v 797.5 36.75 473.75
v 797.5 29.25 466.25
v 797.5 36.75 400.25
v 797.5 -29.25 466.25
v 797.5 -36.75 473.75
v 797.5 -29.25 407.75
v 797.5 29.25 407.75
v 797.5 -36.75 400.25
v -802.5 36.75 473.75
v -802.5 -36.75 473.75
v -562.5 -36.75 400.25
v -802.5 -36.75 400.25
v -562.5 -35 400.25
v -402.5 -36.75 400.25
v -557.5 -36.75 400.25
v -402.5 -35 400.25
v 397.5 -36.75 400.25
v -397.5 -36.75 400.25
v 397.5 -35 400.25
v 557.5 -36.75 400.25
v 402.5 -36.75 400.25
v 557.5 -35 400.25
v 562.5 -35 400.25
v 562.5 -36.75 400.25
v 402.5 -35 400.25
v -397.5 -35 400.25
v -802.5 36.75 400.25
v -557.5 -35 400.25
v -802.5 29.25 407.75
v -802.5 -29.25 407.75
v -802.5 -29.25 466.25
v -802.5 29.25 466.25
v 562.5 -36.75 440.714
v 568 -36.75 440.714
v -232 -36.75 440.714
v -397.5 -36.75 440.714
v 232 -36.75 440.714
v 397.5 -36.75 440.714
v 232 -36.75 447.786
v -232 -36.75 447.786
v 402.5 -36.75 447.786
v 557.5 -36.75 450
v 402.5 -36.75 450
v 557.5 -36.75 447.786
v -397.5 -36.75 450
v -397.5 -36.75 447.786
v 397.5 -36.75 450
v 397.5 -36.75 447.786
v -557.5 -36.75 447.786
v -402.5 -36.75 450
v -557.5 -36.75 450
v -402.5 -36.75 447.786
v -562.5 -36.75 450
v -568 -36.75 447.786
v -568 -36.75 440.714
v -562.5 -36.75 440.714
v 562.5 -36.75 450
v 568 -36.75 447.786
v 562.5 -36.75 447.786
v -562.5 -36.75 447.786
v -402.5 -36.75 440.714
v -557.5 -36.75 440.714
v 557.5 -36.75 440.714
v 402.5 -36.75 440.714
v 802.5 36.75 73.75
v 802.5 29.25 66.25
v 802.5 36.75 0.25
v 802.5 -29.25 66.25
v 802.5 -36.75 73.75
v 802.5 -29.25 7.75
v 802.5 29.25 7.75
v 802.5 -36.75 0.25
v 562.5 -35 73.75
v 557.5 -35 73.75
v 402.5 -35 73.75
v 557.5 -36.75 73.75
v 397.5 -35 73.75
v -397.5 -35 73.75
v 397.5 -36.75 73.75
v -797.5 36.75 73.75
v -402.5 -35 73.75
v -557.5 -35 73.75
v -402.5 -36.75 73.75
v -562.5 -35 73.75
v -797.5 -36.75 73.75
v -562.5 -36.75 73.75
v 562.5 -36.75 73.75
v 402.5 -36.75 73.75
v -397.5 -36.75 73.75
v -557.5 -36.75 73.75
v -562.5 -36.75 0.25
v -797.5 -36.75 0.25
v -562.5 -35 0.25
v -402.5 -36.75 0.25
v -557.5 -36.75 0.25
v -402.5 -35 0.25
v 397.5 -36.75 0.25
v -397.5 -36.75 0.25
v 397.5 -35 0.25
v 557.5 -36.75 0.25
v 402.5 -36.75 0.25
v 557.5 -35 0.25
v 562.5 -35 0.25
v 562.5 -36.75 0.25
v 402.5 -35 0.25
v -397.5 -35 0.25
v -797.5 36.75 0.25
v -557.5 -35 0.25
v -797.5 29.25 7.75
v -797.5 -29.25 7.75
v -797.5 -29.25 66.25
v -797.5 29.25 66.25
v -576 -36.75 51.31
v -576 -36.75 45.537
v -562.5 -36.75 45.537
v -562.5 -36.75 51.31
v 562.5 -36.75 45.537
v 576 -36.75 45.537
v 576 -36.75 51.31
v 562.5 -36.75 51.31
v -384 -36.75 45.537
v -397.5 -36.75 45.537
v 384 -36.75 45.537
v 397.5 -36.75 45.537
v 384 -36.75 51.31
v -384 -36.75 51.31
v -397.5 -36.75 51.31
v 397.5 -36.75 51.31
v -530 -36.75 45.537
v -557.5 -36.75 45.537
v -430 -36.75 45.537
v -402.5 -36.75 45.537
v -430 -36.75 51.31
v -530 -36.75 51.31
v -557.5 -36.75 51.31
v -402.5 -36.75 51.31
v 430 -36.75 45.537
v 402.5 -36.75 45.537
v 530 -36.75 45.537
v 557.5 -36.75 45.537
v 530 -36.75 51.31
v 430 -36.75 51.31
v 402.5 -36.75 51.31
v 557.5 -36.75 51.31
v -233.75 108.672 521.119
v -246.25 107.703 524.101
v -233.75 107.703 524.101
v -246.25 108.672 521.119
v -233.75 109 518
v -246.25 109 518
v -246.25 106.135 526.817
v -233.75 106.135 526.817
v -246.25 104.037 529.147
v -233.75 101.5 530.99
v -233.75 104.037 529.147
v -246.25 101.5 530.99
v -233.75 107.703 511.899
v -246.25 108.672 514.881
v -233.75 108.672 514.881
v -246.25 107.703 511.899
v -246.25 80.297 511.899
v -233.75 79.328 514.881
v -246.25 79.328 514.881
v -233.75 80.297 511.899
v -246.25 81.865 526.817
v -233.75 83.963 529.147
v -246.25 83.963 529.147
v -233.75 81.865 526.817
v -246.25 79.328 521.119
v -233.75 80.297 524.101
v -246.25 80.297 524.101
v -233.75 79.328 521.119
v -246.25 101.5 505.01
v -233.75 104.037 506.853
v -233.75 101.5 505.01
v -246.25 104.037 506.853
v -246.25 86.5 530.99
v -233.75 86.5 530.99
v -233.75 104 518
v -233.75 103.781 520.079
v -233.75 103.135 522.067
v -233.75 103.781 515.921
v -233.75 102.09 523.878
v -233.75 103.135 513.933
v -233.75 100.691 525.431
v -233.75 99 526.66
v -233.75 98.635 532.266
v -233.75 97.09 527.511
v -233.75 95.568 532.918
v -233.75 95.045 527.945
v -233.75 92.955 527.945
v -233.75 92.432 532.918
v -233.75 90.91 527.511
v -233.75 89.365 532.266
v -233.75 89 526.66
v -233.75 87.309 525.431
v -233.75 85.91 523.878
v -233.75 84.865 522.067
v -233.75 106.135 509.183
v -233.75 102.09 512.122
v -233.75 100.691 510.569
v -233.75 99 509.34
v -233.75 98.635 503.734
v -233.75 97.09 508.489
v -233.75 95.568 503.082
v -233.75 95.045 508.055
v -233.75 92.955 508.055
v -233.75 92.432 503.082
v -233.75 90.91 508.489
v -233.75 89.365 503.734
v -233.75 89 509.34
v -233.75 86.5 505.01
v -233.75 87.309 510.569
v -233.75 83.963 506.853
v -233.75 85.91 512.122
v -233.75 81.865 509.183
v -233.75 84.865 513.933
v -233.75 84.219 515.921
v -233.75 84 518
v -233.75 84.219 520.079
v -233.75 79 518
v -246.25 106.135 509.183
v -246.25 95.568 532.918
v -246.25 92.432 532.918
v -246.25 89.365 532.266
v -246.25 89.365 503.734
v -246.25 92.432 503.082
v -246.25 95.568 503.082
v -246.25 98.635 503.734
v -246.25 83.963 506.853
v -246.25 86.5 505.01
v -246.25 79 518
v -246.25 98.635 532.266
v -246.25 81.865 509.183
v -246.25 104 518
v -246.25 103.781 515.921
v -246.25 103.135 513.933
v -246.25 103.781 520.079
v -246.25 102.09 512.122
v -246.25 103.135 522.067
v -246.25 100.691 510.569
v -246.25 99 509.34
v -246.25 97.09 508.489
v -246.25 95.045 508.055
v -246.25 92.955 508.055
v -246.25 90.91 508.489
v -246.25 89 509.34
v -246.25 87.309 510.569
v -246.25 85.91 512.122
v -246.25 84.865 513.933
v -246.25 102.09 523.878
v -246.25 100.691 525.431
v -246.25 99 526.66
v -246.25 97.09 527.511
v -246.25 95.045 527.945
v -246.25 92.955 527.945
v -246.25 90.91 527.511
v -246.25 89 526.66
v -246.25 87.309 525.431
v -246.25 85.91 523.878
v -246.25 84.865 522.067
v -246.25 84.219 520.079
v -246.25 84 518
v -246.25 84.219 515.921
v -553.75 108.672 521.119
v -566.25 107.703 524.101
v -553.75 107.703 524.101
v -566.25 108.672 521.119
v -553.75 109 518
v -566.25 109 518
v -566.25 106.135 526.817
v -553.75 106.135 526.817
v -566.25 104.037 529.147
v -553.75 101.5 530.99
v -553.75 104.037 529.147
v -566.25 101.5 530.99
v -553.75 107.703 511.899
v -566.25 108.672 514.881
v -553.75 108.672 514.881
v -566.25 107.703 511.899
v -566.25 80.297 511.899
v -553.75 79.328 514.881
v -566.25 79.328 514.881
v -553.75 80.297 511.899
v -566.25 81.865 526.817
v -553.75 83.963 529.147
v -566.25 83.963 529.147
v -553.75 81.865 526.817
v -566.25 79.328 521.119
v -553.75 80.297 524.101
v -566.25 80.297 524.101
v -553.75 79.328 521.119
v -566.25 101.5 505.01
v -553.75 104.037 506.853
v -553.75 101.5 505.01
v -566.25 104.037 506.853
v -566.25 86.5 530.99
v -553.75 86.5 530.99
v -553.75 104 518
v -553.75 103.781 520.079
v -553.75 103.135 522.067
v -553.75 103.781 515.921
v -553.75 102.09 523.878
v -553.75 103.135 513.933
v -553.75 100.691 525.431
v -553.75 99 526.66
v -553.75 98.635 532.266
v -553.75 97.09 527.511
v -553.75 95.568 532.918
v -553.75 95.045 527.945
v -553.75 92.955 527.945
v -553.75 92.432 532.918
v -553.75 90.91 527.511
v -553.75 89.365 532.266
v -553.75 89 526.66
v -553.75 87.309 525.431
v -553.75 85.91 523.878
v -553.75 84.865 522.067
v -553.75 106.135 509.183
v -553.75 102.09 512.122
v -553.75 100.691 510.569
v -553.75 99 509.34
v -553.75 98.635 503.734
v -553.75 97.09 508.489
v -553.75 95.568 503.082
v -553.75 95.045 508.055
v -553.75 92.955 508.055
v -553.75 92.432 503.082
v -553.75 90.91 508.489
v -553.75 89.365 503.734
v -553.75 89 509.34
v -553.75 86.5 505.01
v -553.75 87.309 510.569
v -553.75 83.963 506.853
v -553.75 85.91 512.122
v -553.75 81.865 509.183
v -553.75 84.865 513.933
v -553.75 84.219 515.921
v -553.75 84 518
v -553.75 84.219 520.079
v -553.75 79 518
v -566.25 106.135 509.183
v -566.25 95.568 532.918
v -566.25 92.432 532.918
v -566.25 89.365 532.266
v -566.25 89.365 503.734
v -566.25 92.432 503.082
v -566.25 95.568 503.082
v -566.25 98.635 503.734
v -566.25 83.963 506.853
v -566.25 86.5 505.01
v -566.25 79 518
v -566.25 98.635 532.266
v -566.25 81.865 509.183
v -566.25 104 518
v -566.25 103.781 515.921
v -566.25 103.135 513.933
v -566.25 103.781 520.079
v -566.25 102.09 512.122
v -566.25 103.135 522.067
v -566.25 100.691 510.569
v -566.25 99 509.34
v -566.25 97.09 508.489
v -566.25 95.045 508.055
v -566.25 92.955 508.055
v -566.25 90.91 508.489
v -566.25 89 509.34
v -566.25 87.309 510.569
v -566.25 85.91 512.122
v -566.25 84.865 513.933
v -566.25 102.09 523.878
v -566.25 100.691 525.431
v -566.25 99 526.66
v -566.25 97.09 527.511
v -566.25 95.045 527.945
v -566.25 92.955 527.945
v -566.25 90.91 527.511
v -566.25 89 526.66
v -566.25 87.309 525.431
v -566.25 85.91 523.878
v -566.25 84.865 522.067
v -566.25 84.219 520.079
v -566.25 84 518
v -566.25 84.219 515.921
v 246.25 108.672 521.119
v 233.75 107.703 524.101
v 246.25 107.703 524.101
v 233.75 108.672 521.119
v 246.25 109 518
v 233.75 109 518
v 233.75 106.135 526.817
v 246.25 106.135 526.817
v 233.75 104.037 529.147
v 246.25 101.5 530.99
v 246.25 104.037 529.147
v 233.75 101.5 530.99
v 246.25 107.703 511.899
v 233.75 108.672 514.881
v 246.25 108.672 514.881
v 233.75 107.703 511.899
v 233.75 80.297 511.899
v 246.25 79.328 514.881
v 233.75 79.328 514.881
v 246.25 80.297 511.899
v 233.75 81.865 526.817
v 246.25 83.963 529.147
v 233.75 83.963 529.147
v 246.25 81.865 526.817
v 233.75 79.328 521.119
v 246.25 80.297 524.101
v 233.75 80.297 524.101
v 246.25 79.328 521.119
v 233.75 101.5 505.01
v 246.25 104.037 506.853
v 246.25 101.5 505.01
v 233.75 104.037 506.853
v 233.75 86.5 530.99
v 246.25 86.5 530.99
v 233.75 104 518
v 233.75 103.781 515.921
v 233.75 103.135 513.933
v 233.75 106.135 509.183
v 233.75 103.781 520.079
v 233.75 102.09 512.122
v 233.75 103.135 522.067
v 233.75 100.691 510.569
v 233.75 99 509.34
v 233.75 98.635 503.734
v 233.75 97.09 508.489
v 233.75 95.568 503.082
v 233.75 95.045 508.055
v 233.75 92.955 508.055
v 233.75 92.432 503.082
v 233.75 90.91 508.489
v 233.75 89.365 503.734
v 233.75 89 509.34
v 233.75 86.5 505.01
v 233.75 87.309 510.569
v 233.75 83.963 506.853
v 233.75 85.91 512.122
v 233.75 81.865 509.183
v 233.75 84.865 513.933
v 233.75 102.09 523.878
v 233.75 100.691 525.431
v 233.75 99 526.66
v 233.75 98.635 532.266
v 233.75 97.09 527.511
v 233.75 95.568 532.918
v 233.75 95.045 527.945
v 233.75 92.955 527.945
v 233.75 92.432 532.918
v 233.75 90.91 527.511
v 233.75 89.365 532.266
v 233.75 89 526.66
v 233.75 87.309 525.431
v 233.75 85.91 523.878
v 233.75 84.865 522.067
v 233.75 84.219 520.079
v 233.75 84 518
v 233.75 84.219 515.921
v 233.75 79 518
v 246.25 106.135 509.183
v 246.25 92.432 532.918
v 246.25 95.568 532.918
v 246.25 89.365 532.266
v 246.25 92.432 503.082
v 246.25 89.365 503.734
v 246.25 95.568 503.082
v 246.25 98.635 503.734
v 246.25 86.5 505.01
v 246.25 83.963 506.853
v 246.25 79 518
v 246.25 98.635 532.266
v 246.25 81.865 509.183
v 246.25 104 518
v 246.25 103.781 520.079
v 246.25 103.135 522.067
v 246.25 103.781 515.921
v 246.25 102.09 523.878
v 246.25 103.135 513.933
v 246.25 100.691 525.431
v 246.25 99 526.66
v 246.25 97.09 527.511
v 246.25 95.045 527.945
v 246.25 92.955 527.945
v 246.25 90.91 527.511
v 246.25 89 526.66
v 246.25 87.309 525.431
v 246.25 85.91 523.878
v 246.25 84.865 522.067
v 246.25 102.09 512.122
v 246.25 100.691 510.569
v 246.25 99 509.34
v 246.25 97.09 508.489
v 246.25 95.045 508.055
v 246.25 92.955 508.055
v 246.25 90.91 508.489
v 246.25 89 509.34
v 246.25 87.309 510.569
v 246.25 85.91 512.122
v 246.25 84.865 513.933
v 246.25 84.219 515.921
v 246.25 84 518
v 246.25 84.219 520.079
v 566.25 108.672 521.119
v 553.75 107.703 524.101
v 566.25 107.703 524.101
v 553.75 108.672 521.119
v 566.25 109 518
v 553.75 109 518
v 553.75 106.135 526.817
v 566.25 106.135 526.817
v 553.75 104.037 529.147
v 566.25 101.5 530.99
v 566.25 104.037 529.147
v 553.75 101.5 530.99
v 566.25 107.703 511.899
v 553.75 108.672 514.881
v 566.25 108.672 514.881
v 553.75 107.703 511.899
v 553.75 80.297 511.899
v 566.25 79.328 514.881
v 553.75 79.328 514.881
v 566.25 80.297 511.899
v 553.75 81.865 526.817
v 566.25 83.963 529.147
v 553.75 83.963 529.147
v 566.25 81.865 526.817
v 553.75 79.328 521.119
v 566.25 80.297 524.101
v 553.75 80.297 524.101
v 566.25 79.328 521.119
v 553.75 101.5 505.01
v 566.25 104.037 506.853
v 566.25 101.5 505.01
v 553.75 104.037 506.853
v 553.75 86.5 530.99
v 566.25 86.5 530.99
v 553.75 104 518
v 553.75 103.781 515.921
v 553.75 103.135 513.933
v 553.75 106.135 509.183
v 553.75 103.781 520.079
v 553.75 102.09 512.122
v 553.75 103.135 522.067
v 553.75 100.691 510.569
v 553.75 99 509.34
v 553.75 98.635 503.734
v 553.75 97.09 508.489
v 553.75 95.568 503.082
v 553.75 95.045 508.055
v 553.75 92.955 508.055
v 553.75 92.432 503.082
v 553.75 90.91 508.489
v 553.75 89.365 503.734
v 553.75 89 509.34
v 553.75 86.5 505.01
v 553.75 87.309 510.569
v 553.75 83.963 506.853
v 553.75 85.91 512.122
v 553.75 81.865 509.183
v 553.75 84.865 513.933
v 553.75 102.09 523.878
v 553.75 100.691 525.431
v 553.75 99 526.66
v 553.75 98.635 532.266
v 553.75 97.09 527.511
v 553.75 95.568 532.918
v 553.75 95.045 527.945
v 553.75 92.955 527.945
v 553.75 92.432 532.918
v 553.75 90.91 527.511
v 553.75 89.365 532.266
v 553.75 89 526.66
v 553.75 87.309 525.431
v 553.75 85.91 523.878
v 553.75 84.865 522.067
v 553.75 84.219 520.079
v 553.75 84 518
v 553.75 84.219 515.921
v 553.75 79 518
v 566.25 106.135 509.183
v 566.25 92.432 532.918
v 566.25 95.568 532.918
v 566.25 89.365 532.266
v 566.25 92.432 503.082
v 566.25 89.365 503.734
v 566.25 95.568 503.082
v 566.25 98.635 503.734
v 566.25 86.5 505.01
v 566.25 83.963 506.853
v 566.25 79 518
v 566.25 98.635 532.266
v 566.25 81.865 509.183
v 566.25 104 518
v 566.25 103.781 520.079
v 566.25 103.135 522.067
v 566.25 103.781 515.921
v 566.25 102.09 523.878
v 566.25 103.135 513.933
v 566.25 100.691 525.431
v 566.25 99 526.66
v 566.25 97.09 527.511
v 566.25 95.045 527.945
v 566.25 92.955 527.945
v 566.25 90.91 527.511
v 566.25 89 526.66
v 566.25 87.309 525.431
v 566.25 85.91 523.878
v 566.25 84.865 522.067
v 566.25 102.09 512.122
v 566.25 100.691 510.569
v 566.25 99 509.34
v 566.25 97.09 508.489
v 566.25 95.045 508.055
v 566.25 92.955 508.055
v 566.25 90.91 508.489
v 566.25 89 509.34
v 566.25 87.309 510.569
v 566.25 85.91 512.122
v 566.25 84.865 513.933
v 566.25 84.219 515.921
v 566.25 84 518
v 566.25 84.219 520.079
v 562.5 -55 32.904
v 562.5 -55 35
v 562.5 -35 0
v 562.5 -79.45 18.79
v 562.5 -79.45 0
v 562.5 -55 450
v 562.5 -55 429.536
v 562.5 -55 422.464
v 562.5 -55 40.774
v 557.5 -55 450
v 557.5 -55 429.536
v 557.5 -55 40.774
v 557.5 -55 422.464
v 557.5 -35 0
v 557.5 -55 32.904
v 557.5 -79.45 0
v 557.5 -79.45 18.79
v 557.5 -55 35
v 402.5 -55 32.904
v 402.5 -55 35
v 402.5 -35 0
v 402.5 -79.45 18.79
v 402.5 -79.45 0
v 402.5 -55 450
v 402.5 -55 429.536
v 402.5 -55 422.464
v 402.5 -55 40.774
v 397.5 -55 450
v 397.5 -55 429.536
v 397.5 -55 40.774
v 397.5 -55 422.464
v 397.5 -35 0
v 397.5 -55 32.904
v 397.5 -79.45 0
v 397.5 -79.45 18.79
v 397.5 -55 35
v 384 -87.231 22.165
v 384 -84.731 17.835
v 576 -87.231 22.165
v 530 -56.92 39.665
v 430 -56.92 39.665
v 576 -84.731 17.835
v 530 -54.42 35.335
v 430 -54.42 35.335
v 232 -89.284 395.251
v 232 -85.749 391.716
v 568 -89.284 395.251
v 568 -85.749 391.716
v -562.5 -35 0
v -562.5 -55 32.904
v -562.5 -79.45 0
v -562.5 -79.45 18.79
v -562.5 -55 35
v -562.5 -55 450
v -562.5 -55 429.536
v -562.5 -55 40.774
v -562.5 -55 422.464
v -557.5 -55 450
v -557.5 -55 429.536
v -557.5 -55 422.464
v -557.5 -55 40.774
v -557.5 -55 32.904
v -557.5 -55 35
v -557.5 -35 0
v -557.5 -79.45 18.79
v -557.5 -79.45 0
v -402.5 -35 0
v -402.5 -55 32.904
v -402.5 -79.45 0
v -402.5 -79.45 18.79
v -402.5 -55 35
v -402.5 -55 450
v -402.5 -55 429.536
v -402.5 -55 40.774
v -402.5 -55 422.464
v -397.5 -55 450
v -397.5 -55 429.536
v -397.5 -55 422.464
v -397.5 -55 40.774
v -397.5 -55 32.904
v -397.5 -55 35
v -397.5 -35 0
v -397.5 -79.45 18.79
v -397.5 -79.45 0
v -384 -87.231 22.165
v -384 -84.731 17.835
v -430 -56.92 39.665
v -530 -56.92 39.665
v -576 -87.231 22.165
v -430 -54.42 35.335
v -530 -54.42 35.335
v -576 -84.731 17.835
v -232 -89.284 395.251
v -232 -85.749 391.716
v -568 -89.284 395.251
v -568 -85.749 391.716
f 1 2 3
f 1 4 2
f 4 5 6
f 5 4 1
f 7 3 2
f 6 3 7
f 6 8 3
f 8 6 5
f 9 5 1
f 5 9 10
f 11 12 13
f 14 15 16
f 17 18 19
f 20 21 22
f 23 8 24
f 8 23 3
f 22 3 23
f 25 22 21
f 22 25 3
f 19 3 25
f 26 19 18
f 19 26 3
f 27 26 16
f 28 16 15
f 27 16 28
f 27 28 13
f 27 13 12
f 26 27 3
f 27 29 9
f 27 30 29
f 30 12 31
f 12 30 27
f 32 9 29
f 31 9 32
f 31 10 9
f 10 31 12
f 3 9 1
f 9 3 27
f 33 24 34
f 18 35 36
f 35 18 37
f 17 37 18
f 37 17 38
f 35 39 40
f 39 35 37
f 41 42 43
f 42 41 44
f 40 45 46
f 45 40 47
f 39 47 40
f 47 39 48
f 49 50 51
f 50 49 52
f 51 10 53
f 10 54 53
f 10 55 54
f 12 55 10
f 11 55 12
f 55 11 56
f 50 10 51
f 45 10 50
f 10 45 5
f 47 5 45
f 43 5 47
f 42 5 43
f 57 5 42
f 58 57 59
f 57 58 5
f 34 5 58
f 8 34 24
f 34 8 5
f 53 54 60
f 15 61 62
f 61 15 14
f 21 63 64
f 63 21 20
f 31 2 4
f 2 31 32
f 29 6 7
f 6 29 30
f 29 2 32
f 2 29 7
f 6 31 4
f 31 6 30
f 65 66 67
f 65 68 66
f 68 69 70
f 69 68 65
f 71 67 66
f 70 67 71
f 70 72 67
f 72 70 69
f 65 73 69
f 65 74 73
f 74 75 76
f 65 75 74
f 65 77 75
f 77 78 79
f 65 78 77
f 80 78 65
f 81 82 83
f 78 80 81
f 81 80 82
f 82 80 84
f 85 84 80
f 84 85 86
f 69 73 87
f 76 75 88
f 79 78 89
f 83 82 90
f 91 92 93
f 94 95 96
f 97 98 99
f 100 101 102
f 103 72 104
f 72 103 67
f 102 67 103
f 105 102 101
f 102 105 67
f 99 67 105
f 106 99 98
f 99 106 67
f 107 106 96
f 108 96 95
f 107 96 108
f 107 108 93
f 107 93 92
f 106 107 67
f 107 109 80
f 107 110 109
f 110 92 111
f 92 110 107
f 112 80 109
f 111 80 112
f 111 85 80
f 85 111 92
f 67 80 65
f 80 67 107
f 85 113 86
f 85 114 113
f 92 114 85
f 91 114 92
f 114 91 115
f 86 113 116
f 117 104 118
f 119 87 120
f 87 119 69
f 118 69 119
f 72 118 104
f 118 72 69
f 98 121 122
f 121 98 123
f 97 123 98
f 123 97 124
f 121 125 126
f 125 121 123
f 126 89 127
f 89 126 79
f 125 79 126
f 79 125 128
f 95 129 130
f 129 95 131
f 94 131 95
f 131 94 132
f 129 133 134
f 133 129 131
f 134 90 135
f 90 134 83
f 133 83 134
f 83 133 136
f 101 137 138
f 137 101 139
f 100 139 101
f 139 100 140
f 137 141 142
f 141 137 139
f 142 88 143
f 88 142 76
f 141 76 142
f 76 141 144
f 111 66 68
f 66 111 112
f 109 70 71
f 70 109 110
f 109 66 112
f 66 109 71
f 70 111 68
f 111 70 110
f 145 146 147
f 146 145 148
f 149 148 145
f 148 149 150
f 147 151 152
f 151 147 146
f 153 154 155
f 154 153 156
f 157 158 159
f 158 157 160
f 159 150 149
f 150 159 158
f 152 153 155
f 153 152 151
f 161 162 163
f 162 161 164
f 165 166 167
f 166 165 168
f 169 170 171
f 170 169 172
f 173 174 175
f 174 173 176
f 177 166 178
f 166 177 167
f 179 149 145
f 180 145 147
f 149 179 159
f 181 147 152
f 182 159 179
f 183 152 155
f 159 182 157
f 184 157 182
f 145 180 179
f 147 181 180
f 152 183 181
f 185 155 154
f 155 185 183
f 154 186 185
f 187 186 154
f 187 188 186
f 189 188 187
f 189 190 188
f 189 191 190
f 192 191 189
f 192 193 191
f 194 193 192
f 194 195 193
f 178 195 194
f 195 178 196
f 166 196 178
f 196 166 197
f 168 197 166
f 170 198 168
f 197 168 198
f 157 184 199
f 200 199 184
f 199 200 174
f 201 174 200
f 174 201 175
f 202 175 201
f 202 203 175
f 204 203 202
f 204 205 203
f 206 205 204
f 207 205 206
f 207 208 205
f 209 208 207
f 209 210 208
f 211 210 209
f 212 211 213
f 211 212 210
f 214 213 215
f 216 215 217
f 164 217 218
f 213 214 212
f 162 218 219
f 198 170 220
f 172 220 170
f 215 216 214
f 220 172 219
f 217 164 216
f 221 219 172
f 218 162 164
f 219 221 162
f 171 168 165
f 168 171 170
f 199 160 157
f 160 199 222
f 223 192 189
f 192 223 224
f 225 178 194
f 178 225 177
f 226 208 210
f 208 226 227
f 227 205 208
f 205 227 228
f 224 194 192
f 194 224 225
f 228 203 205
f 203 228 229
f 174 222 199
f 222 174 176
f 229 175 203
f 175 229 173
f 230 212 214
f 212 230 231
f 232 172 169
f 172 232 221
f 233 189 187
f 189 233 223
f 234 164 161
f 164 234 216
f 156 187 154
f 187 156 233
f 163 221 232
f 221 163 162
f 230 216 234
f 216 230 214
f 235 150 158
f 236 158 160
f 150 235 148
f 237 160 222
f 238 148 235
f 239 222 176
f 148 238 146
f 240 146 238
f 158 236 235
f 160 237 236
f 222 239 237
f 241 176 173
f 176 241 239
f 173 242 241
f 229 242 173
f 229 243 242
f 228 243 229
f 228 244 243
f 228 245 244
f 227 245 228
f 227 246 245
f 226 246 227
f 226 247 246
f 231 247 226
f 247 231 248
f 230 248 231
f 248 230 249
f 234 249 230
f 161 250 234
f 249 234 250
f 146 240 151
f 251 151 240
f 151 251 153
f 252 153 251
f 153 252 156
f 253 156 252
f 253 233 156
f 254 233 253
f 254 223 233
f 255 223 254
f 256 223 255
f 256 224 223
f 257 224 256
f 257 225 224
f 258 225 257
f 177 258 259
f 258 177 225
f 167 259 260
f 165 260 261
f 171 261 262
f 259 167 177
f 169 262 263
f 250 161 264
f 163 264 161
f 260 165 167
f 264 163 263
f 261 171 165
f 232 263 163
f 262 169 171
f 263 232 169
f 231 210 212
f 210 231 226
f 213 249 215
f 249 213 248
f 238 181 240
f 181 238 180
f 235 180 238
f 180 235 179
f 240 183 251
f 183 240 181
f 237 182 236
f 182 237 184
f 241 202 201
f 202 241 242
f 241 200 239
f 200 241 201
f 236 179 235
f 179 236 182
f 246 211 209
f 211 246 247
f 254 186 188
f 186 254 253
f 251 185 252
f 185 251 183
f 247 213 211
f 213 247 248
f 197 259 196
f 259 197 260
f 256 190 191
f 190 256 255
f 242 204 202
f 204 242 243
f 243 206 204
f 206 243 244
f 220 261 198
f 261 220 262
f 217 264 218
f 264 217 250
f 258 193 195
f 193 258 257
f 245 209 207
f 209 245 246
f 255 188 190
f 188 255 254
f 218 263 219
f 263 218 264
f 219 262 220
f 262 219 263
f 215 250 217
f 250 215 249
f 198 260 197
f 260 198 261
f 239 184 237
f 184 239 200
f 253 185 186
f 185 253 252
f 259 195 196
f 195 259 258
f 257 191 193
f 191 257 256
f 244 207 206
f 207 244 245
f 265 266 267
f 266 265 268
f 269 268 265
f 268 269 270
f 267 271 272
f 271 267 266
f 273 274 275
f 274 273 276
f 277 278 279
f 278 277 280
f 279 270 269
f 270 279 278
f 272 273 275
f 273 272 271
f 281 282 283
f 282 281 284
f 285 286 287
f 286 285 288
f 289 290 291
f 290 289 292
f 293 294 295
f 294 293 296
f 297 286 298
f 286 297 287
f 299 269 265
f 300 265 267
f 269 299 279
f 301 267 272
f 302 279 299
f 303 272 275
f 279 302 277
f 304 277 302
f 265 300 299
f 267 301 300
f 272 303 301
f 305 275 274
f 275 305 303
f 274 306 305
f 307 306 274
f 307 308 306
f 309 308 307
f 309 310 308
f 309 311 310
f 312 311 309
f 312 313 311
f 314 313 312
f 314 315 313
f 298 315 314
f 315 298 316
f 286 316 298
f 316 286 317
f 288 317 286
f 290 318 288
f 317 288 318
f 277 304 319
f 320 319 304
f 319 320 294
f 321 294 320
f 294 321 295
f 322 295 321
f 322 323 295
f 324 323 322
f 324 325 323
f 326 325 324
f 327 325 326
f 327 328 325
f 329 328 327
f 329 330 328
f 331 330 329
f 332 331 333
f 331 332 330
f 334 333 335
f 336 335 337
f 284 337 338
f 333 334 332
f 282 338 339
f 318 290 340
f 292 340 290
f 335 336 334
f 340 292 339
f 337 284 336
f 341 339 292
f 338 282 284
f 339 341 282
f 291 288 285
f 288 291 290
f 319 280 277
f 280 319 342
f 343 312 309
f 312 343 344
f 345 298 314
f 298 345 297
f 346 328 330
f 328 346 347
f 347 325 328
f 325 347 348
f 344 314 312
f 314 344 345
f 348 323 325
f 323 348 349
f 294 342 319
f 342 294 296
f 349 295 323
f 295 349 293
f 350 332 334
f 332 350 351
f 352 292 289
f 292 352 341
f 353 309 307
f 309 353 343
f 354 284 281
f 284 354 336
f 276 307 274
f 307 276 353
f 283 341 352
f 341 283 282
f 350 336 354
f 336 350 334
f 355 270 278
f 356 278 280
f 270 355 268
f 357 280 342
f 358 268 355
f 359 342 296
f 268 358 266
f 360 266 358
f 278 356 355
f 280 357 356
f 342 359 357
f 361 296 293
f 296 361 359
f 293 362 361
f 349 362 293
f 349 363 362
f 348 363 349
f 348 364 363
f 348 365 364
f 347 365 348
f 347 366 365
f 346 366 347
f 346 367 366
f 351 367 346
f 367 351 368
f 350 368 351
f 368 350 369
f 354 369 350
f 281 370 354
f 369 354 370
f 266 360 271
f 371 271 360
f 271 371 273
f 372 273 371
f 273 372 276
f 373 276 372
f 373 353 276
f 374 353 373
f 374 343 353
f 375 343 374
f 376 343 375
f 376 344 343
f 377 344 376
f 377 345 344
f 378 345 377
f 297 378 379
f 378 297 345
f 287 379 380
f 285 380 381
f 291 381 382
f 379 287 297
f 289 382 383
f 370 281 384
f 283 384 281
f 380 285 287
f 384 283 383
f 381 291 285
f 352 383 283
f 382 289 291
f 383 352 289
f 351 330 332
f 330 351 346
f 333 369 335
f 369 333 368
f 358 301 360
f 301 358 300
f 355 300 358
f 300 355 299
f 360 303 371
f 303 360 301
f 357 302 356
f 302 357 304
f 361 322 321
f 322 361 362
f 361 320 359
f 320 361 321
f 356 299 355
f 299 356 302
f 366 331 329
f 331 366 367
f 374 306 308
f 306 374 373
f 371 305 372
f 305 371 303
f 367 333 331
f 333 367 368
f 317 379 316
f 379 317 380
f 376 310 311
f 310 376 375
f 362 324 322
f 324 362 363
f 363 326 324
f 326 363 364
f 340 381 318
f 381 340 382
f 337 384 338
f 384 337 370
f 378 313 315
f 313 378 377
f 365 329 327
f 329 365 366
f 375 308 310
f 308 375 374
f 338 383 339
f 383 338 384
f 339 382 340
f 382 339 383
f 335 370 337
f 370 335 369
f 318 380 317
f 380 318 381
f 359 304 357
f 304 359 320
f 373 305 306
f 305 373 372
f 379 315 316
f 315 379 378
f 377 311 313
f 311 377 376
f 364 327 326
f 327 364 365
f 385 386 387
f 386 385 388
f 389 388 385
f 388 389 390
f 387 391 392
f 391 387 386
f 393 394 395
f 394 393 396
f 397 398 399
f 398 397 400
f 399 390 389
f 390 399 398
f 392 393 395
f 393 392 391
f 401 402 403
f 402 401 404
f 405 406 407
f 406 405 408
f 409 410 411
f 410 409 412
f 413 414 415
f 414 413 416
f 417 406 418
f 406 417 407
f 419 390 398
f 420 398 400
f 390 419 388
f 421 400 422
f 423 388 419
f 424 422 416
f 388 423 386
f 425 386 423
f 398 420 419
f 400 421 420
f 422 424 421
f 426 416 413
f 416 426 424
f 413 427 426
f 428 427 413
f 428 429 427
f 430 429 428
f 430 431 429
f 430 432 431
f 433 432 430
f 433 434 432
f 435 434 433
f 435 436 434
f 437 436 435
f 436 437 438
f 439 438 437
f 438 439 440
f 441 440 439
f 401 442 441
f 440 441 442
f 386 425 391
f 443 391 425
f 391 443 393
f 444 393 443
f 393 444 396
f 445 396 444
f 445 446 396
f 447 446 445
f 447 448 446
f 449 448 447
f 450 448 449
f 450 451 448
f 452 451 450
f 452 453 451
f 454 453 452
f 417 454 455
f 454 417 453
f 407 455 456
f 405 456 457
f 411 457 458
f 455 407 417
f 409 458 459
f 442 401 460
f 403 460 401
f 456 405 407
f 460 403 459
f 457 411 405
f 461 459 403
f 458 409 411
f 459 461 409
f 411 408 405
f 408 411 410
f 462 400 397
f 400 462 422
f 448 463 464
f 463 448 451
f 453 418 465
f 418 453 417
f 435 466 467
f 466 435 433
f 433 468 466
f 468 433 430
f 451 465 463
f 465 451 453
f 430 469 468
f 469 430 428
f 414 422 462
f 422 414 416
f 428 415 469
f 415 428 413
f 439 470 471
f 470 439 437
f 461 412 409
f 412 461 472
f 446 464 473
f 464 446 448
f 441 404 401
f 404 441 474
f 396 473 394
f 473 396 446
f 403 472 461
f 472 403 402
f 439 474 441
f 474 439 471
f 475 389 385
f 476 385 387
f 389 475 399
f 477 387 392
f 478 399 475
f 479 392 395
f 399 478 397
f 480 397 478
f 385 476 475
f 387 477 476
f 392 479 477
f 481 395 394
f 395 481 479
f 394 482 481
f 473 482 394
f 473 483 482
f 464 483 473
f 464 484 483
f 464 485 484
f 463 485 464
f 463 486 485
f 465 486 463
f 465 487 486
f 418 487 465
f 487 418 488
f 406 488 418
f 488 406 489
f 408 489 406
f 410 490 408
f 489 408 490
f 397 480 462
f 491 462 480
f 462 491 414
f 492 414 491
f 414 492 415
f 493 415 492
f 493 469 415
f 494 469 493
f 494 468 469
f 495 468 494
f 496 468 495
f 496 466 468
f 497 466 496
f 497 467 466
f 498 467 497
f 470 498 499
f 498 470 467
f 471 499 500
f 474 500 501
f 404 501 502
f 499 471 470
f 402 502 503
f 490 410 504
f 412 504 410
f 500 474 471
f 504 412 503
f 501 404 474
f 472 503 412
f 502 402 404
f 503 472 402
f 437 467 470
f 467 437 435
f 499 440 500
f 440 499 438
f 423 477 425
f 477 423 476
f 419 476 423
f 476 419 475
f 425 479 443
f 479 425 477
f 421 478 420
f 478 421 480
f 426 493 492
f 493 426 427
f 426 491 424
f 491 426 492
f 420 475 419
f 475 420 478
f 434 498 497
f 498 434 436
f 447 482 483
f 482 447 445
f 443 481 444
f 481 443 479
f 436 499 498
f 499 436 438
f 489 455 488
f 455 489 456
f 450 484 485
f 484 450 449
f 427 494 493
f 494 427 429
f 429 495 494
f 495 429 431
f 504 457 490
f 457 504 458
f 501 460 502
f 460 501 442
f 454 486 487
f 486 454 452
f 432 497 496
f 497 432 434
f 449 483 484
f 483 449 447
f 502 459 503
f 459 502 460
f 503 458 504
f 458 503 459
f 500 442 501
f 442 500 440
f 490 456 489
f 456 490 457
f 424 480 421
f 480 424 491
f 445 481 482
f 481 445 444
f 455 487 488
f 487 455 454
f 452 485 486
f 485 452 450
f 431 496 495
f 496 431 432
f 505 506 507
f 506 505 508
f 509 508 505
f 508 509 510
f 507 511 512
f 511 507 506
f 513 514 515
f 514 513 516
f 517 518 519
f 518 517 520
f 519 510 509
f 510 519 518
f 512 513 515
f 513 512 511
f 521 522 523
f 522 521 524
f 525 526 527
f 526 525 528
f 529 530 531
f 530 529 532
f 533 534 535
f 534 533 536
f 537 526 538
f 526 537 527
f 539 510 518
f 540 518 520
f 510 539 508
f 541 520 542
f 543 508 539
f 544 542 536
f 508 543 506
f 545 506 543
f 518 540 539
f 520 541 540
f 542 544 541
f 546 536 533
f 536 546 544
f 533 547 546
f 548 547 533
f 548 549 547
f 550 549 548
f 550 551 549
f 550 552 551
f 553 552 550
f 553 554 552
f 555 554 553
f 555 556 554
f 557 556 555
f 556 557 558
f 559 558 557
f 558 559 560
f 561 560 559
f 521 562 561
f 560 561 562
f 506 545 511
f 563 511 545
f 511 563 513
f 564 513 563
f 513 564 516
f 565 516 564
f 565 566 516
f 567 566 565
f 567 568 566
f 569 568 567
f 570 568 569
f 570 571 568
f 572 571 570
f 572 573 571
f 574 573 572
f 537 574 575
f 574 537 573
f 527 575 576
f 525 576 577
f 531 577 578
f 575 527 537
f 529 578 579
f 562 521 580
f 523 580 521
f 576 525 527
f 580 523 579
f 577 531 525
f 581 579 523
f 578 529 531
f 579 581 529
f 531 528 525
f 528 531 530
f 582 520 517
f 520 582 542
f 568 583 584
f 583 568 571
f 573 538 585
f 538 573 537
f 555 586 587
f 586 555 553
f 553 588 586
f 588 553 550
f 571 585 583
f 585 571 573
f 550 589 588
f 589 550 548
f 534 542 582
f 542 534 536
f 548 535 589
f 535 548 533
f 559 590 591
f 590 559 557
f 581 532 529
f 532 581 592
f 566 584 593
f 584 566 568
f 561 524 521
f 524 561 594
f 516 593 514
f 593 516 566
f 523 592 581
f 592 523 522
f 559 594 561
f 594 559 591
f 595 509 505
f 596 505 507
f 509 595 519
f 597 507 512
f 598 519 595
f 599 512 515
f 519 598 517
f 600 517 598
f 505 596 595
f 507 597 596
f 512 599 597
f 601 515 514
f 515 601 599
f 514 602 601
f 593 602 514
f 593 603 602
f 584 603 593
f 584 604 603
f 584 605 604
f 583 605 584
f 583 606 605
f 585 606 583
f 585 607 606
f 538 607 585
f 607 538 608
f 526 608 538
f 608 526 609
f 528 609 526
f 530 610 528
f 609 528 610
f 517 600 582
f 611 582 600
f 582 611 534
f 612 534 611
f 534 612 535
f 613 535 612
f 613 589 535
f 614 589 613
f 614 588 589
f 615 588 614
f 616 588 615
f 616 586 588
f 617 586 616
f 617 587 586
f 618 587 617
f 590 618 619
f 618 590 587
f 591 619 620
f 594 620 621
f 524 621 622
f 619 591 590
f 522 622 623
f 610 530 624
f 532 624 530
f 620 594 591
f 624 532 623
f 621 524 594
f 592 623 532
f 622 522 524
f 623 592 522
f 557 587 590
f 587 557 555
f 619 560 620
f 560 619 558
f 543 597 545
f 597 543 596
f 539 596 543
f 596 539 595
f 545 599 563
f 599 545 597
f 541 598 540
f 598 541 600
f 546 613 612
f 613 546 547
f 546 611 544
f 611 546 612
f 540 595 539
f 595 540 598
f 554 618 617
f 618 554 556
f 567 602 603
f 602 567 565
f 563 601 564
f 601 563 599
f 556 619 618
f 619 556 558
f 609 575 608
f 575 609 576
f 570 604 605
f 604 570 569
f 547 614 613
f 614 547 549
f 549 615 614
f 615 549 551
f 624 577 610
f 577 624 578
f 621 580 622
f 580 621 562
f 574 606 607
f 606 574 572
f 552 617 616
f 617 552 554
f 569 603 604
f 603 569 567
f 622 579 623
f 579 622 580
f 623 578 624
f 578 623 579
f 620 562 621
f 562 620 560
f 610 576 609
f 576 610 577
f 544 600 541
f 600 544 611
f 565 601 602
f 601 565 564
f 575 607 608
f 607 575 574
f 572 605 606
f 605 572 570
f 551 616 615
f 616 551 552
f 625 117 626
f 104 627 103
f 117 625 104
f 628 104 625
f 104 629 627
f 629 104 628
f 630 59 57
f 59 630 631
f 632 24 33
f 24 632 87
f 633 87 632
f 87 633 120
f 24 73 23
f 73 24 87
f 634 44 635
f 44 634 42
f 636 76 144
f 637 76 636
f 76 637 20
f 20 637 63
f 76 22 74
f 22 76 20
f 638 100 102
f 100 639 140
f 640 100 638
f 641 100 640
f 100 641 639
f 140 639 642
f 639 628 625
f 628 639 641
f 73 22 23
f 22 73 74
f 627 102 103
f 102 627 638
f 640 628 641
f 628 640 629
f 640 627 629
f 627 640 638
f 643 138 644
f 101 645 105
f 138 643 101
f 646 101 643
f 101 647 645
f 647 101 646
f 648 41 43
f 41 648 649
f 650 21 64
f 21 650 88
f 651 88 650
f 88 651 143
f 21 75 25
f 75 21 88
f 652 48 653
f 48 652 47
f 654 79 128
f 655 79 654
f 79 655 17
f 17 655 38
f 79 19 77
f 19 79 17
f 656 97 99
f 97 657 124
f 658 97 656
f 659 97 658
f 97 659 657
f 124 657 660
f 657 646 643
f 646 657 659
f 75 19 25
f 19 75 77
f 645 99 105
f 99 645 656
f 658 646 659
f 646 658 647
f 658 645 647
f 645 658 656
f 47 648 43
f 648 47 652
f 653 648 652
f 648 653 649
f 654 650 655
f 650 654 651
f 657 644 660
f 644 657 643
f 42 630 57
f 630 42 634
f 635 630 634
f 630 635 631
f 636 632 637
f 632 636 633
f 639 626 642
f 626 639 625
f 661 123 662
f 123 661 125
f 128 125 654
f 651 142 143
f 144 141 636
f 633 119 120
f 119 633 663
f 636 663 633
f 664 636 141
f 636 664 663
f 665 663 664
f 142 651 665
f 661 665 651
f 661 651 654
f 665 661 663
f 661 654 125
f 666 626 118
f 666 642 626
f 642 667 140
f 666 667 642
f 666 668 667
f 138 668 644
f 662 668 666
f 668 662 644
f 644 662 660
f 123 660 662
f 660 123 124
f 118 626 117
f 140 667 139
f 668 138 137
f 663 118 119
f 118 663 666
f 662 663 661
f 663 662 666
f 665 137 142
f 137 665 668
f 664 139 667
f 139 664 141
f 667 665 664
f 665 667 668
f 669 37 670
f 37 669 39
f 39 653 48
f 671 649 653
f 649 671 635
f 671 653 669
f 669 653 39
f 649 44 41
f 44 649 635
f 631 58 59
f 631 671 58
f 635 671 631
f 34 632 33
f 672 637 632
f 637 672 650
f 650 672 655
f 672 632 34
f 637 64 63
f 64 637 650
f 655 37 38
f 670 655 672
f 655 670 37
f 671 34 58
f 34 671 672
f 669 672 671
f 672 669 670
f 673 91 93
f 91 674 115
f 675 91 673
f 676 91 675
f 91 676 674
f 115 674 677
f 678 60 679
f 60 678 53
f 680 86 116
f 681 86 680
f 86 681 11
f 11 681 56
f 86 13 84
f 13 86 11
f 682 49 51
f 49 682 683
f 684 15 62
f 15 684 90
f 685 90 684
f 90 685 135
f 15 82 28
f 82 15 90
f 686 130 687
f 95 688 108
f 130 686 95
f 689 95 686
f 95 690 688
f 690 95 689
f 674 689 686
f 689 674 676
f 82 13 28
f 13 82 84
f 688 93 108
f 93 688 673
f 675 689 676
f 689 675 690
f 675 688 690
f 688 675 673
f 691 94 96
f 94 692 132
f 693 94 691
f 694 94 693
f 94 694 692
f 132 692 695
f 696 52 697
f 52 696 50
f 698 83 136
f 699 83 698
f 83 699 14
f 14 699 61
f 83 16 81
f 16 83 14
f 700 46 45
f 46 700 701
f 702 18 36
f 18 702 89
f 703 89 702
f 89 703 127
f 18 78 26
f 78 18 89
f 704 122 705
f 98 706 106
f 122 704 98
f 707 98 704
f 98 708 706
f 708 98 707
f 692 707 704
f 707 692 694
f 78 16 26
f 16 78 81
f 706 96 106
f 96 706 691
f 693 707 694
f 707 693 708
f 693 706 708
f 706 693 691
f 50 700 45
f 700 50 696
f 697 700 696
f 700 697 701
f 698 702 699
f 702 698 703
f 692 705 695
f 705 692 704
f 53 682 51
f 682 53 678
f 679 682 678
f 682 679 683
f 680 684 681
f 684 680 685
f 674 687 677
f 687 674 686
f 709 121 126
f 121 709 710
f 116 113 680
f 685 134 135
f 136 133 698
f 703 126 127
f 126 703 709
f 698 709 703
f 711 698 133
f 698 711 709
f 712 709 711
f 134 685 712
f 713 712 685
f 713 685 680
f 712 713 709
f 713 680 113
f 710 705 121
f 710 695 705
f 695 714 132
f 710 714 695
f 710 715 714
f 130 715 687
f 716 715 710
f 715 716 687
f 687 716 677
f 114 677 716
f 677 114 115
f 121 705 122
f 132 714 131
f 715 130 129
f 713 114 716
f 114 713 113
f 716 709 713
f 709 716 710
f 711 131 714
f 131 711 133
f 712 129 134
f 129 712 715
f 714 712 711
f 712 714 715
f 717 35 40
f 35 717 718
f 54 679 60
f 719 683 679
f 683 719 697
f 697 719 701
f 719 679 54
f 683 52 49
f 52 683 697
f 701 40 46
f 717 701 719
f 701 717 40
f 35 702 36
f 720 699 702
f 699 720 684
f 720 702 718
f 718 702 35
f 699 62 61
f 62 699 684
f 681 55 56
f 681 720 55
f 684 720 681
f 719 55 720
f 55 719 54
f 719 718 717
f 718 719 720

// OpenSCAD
/*
ssqa module{
dependent from full length
this module in particular needs to be customizable
integrated with the squares
}
*/

// INDEPENDENT VARIABLES
/* Tynes Subassemblies parameters*/
l=1600;// width of grapples
tynes_num=10;//ammmount of inner tynes
sh_thick=5; // Sheet thickness

/*Lid Parameters*/
l_lid=320;

// DEPENDENT VARIABLES**DON'T CHANGE**
d_b_tynes=l/tynes_num;// distance between tynes recalculation
l_ratio=(l_lid-l_lid*0.07)/450;// Recalculation of front and up plate based on original size

d_b_bar=l_lid/2;
h_bar=450;

module sq_tube(length,size){
	difference(length,size) {
		cube([length,size*24.5,size*24.5], center=true);
		cube([length+length*0.2, size*(24.5)-15, size*(24.5)-15], center=true);
	}
}
/* sq_tube(l,3); */



module support_assem() {
	translate([0,0,37])
	rotate([0, 0, 0]) {
		translate([l/2-sh_thick/2,0,400])
		rotate([0,0,0])
		color("blue")
		sq_tube(l,3);

		translate([sh_thick-sh_thick/2+l/2,0,0])
		rotate([0,0,0])
		color("yellow")
		sq_tube(l,3);

	}

	module hinch(){
		rotate([0,90,0])linear_extrude(center=true,  height = sh_thick)import(file="hinch.dxf");
	}

	module mount_cylinder(){
		for (i=[0:4]) {
			translate([i*(sh_thick+sh_thick*0.1)-sh_thick*2, 0, 0])
			rotate([0,90,0])
			linear_extrude(center=true,  height = sh_thick)import(file="mount_cylinder.dxf");
		}

	}

	/* translate([0,15,-20]){} */
module hinches(){
						color("green"){
						translate([l/4-l_lid/2,-55,420])
						hinch();
						translate([l/4+l_lid/2,-55,420])
						hinch();
						translate([l/4,-55,420])
						mount_cylinder();
					}

					translate([l/4+l_lid/2,74,540])
					rotate([90,0,90])
					tube(15,sh_thick*2+sh_thick*0.5,5);

					translate([l/4-l_lid/2,74,540])
					rotate([90,0,90])
					tube(15,sh_thick*2+sh_thick*0.5,5);
				}

translate([0, 20, -22]) {
	hinches();
	translate([l,0,0])
	mirror(){
		hinches();
		}
	}
}


module tube(r,lng,th){
	difference(){
		cylinder(r=r, h=lng, center=true);
		cylinder(r=r-th, h=lng+lng*0.2, center=true);
	}
}

module ssqa(){
	module base_part(){
		module triangle(o_len, a_len, depth, center=false){
			centroid = center ? [-a_len/3, -o_len/3, -depth/2] : [0, 0, 0];
			translate(centroid) linear_extrude(height=depth){
				polygon(points=[[0,0],[a_len,0],[0,o_len]], paths=[[0,1,2]]);
			}
		}

		cb_h=18.79;
		cb_l=44.45;
		translate([0,cb_h,0])
		triangle(cb_l-cb_h,cb_l,sh_thick, false);
		cube([cb_l,cb_h,sh_thick], center=false);
	}

	color("red") {
		translate([0,16,220])
		rotate([-45, 0, 0])
		union(){
			cube(size=[l_lid+l_lid*0.05,75,sh_thick], center=true);
		}
	}

translate([-l_lid/4,0,0]){
	translate([0,0,25])
	union(){
		translate([-d_b_bar/2-sh_thick/2,-10,-225])
		rotate([90,0,90])
		base_part();

		translate([d_b_bar/2-sh_thick/2,-10,-225])
		rotate([90,0,90])
		base_part();

		translate([d_b_bar/2,0,0])
		rotate([0, 90, 0])
		cube(size=[h_bar,20,sh_thick], center=true);

		translate([-d_b_bar/2,0,0])
		rotate([0, 90, 0])
		cube(size=[h_bar,20,sh_thick], center=true);
	}
		color("red")
		translate([0,15,-165]){
			rotate([-30, 0, 0]){
				difference() {
					cube(size=[d_b_bar+d_b_bar*0.2,60,sh_thick], center=true);
					translate([0,-30,0])
					cube(size=[100, 50, 50], center=true);
				}
			}
		}

}

}

translate([-l/2, 0, 0])
support_assem();

translate([0,-45,200]){
translate([l/4,0,0])
rotate([0, 0, 180])
ssqa();

mirror(){
translate([l/4,0,0])
rotate([0, 0, 180])
ssqa();
	}
}
